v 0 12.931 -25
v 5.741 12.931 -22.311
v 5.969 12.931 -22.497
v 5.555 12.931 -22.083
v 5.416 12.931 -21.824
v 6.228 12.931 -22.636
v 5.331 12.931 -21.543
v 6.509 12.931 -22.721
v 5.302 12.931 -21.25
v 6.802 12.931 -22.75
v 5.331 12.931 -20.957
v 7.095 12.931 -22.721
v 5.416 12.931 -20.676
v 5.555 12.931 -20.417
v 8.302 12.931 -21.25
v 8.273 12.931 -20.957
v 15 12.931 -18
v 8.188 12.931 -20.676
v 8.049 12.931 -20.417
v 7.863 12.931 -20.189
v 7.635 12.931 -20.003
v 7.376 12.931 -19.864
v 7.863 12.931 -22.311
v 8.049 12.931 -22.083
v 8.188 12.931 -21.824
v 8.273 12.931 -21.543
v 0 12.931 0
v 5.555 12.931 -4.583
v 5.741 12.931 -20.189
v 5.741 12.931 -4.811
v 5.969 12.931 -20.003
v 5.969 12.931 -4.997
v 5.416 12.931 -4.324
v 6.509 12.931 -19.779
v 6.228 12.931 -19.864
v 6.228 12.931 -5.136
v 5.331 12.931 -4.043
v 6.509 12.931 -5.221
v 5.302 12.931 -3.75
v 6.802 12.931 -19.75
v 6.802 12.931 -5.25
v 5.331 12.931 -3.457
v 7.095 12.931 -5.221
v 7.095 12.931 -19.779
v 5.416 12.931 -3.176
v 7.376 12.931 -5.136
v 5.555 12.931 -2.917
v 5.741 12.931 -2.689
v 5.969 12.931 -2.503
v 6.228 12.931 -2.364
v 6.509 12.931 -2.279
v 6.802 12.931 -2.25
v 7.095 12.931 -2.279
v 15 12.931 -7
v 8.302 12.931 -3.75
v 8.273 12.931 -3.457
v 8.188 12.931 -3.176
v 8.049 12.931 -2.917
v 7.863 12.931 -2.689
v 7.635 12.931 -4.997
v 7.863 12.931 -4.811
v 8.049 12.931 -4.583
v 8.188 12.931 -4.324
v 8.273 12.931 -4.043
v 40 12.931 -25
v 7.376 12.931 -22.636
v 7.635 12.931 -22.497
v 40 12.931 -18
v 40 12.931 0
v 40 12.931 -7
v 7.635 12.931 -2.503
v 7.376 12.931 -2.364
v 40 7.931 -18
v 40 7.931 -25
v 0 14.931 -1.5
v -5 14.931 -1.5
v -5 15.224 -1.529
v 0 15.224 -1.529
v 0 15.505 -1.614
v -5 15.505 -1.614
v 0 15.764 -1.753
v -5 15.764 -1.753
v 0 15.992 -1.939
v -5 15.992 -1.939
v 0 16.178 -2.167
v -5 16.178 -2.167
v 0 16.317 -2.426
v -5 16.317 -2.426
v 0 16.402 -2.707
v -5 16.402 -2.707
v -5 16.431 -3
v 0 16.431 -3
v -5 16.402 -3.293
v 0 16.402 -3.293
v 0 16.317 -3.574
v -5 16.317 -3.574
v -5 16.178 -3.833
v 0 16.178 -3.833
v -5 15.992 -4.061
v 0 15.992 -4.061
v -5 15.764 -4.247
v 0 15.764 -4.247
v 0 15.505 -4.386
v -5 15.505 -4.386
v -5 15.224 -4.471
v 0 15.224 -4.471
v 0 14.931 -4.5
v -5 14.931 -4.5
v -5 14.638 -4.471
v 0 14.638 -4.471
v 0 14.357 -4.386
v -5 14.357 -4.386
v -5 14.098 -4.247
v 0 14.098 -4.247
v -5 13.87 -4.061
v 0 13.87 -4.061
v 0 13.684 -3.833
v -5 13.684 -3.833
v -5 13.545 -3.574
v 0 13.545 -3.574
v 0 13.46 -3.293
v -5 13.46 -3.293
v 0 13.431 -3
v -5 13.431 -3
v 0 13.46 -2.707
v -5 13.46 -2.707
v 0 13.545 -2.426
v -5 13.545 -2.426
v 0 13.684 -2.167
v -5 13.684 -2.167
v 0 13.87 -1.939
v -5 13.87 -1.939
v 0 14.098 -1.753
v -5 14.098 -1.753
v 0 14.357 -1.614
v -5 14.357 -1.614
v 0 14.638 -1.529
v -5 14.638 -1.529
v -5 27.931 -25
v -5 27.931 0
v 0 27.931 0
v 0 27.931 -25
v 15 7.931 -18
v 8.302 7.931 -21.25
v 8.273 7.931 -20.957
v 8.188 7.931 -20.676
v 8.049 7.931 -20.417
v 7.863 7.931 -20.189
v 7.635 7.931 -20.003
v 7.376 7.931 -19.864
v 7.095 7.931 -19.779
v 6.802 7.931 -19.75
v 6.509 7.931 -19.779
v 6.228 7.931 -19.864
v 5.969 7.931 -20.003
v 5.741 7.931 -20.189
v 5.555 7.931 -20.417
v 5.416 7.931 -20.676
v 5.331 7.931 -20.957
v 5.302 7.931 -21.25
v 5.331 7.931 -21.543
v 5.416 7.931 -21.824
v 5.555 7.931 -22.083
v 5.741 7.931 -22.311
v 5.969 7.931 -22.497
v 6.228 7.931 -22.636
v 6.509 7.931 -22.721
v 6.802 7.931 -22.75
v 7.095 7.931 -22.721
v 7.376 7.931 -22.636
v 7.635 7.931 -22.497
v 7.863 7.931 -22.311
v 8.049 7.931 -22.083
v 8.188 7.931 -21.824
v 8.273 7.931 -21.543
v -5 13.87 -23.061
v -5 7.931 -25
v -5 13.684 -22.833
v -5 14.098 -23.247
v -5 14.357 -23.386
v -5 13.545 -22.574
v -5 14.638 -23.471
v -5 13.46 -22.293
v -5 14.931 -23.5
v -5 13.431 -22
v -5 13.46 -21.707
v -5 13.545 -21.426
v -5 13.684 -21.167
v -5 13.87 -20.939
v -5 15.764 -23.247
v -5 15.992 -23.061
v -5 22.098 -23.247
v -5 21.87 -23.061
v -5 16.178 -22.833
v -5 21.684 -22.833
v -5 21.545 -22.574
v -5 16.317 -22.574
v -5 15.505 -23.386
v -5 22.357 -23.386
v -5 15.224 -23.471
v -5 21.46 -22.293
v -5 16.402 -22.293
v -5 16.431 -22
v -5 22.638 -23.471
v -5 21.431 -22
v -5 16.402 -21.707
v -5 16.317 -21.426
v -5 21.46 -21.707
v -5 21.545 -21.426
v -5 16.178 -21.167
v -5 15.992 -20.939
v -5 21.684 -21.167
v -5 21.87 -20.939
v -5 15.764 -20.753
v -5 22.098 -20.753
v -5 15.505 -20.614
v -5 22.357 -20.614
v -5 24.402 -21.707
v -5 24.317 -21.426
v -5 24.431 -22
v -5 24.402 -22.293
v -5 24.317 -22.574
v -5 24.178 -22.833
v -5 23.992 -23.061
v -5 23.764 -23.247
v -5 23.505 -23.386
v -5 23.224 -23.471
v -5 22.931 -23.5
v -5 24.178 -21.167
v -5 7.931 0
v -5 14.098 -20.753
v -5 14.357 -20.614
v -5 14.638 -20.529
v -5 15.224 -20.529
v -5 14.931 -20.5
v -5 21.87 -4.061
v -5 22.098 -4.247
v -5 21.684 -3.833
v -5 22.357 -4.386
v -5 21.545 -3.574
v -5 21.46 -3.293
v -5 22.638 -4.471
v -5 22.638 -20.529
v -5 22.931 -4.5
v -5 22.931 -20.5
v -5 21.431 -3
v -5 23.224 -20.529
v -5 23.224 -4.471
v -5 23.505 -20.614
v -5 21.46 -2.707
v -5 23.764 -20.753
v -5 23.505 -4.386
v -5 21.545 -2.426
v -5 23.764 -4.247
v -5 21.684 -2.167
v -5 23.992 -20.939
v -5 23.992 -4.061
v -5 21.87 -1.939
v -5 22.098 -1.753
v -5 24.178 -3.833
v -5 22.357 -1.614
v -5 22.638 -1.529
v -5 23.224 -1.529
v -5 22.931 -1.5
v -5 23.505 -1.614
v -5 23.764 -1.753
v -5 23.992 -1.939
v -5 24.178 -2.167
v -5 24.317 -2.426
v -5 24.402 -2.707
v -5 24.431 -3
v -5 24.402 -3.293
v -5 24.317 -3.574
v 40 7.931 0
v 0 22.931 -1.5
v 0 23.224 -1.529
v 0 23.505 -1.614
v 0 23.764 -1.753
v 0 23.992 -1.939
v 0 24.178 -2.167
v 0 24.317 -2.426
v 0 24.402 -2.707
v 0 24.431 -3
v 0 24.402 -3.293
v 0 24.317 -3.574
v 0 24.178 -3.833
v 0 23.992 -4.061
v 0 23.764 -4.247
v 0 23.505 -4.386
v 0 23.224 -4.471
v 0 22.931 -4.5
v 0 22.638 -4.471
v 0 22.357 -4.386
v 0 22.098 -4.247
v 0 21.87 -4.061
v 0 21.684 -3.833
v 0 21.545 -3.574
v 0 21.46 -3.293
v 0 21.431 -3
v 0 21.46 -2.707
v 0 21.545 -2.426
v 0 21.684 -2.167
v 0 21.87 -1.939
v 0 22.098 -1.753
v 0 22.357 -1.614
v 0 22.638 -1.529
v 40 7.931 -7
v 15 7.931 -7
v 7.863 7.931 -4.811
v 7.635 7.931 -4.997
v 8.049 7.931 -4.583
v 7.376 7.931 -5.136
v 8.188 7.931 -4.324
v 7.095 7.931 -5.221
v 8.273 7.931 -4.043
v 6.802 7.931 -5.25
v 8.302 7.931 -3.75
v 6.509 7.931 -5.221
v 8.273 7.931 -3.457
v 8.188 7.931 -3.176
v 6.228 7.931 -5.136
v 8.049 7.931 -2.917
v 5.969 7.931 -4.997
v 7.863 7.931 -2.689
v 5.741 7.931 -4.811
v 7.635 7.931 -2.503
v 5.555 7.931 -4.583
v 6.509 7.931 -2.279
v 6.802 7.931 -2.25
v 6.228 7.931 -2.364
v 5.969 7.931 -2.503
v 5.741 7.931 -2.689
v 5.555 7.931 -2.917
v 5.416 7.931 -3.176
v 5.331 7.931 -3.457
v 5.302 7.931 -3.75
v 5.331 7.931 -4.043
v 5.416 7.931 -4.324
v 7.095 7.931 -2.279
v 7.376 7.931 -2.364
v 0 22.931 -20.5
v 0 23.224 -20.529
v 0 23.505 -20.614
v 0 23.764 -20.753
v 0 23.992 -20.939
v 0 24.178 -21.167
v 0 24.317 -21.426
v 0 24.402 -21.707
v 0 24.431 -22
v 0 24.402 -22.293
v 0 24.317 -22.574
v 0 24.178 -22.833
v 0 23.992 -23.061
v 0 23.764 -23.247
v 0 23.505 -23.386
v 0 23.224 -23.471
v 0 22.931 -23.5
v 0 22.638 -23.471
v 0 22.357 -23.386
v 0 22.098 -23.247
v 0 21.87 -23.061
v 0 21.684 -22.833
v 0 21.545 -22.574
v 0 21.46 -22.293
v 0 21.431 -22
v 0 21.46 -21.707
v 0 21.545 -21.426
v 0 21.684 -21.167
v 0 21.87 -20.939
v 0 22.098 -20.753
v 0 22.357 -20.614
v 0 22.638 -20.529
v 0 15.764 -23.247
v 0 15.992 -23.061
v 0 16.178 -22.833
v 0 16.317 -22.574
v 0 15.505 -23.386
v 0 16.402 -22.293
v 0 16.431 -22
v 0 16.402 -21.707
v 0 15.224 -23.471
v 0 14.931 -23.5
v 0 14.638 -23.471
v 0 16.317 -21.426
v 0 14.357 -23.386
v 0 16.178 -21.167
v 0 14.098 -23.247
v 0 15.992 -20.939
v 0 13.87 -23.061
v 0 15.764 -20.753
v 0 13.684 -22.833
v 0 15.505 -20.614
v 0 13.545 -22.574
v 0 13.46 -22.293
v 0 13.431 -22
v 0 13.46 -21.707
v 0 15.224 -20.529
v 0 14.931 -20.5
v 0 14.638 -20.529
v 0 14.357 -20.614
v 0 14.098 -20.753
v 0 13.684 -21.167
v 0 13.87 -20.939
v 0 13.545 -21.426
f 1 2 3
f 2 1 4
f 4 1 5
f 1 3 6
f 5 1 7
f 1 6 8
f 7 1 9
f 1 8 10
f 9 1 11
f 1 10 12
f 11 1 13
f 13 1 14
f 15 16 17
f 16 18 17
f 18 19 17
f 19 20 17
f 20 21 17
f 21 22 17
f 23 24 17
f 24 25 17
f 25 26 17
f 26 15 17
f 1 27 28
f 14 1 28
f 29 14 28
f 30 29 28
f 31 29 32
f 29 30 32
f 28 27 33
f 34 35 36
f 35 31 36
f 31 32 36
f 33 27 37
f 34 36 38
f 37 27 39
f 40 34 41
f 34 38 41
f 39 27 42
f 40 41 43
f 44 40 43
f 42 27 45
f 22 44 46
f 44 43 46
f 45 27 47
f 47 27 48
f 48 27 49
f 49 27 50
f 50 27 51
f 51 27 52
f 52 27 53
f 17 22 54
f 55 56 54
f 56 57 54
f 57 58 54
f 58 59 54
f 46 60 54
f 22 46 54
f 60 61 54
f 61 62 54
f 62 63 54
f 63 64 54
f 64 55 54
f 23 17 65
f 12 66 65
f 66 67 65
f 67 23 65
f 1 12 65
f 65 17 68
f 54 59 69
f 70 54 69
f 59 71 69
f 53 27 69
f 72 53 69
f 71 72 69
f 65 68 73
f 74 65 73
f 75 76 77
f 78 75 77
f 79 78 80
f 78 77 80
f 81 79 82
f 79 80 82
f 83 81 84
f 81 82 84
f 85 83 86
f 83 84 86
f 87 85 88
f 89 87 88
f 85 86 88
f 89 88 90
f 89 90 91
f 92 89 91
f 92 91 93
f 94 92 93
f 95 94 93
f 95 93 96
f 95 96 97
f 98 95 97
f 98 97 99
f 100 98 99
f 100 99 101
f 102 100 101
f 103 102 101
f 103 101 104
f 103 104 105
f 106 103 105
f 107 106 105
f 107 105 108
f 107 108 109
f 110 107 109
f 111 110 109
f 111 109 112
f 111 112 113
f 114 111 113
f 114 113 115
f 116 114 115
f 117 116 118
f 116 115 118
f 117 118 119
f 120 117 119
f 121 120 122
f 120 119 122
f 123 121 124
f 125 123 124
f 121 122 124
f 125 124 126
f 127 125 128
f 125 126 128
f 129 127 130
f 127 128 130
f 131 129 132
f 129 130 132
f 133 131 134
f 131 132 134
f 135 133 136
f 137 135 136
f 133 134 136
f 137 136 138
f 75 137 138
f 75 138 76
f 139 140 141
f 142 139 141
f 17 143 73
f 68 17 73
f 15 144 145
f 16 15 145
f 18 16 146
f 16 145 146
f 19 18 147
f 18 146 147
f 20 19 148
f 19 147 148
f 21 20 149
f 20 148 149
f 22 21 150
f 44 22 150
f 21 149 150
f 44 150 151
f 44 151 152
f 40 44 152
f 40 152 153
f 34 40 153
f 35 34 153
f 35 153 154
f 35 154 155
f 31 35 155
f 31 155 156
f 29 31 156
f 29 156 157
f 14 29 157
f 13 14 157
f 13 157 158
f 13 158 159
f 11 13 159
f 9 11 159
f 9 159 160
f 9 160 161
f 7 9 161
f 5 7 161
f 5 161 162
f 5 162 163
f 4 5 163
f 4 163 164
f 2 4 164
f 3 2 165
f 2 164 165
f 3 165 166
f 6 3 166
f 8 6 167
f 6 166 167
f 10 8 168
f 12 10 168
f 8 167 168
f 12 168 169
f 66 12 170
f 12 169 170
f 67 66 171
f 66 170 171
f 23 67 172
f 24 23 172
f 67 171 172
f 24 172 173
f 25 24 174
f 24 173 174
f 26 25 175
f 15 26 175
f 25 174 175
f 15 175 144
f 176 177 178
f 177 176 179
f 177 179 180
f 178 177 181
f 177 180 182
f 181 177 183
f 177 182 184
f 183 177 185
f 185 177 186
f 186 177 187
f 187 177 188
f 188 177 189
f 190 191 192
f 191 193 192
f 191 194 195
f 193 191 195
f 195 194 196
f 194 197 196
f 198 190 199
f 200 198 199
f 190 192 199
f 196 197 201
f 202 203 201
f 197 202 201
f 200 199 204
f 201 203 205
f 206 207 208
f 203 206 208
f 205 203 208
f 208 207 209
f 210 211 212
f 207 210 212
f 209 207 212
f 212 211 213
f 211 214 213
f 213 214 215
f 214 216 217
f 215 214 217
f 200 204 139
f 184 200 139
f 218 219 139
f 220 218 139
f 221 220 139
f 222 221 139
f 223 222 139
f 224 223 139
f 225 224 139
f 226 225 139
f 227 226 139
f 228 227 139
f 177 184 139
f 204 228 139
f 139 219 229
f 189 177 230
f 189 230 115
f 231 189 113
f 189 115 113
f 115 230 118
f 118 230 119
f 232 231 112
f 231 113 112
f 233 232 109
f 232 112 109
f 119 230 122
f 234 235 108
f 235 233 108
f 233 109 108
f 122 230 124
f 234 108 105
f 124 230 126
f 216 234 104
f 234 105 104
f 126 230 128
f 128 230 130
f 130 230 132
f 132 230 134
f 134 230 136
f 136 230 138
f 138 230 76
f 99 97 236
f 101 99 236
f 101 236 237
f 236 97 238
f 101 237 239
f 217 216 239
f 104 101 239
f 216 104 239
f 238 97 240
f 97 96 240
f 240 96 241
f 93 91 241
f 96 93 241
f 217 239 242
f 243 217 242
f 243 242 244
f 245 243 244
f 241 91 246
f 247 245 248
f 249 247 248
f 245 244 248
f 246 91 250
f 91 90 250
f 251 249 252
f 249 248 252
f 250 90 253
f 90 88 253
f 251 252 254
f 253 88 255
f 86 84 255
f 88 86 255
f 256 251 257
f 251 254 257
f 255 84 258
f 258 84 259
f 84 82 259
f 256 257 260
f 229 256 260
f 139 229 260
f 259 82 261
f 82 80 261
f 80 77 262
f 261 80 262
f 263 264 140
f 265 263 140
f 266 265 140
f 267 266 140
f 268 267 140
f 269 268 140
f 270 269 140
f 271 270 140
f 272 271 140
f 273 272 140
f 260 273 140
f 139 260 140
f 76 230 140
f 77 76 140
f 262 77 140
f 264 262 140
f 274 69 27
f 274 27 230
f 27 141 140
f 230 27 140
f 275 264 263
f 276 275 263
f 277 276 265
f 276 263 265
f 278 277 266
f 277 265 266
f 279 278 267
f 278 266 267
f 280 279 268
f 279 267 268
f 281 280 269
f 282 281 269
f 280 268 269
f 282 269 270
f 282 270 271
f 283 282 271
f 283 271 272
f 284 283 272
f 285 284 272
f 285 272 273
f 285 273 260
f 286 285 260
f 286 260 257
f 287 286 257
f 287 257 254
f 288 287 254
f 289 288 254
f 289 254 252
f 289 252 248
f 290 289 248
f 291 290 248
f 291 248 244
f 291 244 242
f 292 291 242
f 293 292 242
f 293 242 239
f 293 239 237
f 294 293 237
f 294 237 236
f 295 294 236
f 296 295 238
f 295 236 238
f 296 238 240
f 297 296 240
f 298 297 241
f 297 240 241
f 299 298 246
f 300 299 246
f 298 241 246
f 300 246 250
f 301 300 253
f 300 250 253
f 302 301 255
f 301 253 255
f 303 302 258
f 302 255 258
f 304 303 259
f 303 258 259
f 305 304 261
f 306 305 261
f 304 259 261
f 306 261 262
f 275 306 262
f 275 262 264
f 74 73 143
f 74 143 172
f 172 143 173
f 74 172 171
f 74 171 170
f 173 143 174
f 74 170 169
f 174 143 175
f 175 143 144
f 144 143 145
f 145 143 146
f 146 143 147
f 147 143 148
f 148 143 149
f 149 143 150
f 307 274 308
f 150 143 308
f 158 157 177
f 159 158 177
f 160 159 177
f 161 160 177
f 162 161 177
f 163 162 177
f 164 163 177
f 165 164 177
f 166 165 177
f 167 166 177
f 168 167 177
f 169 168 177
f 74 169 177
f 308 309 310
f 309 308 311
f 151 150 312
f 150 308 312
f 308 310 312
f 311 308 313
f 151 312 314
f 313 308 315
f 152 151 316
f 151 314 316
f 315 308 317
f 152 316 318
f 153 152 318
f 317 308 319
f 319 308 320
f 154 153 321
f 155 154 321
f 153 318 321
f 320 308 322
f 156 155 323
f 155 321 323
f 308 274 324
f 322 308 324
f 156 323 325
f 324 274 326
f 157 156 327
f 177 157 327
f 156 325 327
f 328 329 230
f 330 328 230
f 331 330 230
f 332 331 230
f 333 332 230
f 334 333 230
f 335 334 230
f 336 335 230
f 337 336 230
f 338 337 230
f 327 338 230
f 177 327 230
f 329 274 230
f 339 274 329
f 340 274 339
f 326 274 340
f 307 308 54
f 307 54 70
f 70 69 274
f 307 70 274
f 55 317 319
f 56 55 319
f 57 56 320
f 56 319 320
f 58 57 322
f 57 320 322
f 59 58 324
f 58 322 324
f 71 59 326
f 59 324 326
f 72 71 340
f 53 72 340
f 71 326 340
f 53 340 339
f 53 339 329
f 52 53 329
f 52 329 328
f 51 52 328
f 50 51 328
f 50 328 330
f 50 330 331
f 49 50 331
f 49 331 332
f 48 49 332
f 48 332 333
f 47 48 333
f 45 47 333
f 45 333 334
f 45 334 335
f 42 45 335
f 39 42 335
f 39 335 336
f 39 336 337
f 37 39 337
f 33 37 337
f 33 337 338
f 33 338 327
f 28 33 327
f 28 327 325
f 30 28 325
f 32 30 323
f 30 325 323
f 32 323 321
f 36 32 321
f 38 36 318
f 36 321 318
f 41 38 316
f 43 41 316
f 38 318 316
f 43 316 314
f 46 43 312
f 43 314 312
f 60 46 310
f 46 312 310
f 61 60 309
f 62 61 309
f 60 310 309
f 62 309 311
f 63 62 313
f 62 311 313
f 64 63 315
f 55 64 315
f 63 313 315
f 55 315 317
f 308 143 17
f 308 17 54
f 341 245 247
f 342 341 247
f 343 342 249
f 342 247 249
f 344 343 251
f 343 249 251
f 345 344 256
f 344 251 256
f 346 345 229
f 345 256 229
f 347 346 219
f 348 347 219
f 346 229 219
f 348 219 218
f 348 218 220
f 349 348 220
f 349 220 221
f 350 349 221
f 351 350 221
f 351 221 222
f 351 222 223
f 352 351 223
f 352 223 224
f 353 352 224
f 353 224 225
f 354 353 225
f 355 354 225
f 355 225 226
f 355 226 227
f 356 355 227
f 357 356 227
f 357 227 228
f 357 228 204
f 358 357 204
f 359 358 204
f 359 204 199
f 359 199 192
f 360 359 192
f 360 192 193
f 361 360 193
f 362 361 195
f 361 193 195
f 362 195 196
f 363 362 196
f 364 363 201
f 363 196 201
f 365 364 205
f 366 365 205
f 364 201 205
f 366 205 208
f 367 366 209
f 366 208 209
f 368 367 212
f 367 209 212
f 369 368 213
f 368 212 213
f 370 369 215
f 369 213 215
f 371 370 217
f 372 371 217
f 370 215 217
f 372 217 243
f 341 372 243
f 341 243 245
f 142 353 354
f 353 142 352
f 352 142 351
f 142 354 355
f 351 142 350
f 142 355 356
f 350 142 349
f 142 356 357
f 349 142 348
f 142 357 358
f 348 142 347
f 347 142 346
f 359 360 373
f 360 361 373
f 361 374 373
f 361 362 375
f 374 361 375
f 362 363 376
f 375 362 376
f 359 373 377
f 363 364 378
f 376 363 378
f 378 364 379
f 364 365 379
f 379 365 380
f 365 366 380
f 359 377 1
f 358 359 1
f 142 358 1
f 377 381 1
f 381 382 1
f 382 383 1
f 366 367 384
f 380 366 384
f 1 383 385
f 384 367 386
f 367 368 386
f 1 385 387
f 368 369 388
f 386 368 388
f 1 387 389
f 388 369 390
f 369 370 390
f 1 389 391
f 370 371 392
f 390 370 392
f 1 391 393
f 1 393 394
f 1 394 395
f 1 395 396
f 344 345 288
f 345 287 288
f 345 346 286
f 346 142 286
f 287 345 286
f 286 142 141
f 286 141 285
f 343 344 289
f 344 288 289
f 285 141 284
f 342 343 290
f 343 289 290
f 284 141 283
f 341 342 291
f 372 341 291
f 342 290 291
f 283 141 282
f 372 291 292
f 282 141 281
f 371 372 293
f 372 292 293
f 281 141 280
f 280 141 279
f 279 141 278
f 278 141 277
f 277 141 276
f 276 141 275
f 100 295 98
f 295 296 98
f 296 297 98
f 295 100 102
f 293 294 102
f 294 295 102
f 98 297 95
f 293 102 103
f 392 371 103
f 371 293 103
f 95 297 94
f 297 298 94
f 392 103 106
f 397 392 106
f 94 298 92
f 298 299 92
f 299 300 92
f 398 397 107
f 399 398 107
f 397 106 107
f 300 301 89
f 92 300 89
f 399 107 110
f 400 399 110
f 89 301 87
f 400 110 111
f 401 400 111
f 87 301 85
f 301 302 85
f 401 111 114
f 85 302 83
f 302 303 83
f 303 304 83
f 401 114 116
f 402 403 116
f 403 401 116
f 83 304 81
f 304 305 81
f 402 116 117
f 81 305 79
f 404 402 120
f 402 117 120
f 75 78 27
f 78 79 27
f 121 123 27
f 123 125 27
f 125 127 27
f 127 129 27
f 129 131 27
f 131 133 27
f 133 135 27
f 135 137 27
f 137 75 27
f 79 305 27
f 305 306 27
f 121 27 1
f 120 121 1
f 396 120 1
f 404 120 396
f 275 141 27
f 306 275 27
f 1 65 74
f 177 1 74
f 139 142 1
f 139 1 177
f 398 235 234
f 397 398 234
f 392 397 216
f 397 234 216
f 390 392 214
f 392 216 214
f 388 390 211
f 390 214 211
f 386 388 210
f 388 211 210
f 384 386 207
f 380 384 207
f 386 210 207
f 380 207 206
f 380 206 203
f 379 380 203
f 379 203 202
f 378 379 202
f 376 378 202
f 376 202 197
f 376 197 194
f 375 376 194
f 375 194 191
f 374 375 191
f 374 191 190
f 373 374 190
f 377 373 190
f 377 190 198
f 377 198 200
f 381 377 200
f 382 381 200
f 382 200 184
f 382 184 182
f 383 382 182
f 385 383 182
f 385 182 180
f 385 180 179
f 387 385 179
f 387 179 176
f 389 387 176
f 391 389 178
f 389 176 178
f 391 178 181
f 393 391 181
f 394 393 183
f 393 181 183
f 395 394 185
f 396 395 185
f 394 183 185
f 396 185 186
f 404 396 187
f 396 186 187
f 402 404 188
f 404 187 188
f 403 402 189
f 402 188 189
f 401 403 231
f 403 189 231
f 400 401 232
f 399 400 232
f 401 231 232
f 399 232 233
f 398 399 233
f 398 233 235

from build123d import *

# Parameters (mm, degrees)
BOSS_EXTRUDE1_DEPTH = 25
SKETCH2_R           = 1.5
CUT_EXTRUDE1_DEPTH  = 26
SKETCH3_R           = 1.5
SKETCH3_W           = 25
SKETCH3_H           = 9
CUT_EXTRUDE2_DEPTH  = 10
SKETCH5_W           = 25
SKETCH5_H           = 1
CUT_EXTRUDE3_DEPTH  = 50


with BuildPart() as part:
    # Sketch1 → Boss-Extrude1 (new body)
    with BuildSketch(Plane.XY):
        Polygon((0, 27.931034483), (0, 12.931034483), (40, 12.931034483), (40, 7.931034483), (-5, 7.931034483), (-5, 27.931034483), align=None)
    extrude(amount=-BOSS_EXTRUDE1_DEPTH)

    # Sketch2 → Cut-Extrude1 (cut)
    with BuildSketch(Plane.ZY.offset(5)):
        with Locations((-22, 22.931034483)):
            Circle(SKETCH2_R)
        with Locations((-3, 22.931034483)):
            Circle(SKETCH2_R)
        with Locations((-3, 14.931034483)):
            Circle(SKETCH2_R)
        with Locations((-22, 14.931034483)):
            Circle(SKETCH2_R)
    extrude(amount=-CUT_EXTRUDE1_DEPTH, mode=Mode.SUBTRACT)

    # Sketch3 → Cut-Extrude2 (cut)
    with BuildSketch(Plane.XZ.offset(-7.931034483)):
        with Locations((6.802030066, -3.75)):
            Circle(SKETCH3_R)
        with Locations((6.802030066, -21.25)):
            Circle(SKETCH3_R)
        with Locations((27.5, -12.5)):
            Rectangle(SKETCH3_W, SKETCH3_H)
    extrude(amount=-CUT_EXTRUDE2_DEPTH, mode=Mode.SUBTRACT)

    # Sketch5 → Cut-Extrude3 (cut)
    with BuildSketch(Plane.XZ.offset(-7.931034483)):
        with Locations((27.5, -7.5)):
            Rectangle(SKETCH5_W, SKETCH5_H)
        with Locations((27.5, -17.5)):
            Rectangle(SKETCH5_W, SKETCH5_H)
    extrude(amount=-CUT_EXTRUDE3_DEPTH, mode=Mode.SUBTRACT)


solid = part.part
